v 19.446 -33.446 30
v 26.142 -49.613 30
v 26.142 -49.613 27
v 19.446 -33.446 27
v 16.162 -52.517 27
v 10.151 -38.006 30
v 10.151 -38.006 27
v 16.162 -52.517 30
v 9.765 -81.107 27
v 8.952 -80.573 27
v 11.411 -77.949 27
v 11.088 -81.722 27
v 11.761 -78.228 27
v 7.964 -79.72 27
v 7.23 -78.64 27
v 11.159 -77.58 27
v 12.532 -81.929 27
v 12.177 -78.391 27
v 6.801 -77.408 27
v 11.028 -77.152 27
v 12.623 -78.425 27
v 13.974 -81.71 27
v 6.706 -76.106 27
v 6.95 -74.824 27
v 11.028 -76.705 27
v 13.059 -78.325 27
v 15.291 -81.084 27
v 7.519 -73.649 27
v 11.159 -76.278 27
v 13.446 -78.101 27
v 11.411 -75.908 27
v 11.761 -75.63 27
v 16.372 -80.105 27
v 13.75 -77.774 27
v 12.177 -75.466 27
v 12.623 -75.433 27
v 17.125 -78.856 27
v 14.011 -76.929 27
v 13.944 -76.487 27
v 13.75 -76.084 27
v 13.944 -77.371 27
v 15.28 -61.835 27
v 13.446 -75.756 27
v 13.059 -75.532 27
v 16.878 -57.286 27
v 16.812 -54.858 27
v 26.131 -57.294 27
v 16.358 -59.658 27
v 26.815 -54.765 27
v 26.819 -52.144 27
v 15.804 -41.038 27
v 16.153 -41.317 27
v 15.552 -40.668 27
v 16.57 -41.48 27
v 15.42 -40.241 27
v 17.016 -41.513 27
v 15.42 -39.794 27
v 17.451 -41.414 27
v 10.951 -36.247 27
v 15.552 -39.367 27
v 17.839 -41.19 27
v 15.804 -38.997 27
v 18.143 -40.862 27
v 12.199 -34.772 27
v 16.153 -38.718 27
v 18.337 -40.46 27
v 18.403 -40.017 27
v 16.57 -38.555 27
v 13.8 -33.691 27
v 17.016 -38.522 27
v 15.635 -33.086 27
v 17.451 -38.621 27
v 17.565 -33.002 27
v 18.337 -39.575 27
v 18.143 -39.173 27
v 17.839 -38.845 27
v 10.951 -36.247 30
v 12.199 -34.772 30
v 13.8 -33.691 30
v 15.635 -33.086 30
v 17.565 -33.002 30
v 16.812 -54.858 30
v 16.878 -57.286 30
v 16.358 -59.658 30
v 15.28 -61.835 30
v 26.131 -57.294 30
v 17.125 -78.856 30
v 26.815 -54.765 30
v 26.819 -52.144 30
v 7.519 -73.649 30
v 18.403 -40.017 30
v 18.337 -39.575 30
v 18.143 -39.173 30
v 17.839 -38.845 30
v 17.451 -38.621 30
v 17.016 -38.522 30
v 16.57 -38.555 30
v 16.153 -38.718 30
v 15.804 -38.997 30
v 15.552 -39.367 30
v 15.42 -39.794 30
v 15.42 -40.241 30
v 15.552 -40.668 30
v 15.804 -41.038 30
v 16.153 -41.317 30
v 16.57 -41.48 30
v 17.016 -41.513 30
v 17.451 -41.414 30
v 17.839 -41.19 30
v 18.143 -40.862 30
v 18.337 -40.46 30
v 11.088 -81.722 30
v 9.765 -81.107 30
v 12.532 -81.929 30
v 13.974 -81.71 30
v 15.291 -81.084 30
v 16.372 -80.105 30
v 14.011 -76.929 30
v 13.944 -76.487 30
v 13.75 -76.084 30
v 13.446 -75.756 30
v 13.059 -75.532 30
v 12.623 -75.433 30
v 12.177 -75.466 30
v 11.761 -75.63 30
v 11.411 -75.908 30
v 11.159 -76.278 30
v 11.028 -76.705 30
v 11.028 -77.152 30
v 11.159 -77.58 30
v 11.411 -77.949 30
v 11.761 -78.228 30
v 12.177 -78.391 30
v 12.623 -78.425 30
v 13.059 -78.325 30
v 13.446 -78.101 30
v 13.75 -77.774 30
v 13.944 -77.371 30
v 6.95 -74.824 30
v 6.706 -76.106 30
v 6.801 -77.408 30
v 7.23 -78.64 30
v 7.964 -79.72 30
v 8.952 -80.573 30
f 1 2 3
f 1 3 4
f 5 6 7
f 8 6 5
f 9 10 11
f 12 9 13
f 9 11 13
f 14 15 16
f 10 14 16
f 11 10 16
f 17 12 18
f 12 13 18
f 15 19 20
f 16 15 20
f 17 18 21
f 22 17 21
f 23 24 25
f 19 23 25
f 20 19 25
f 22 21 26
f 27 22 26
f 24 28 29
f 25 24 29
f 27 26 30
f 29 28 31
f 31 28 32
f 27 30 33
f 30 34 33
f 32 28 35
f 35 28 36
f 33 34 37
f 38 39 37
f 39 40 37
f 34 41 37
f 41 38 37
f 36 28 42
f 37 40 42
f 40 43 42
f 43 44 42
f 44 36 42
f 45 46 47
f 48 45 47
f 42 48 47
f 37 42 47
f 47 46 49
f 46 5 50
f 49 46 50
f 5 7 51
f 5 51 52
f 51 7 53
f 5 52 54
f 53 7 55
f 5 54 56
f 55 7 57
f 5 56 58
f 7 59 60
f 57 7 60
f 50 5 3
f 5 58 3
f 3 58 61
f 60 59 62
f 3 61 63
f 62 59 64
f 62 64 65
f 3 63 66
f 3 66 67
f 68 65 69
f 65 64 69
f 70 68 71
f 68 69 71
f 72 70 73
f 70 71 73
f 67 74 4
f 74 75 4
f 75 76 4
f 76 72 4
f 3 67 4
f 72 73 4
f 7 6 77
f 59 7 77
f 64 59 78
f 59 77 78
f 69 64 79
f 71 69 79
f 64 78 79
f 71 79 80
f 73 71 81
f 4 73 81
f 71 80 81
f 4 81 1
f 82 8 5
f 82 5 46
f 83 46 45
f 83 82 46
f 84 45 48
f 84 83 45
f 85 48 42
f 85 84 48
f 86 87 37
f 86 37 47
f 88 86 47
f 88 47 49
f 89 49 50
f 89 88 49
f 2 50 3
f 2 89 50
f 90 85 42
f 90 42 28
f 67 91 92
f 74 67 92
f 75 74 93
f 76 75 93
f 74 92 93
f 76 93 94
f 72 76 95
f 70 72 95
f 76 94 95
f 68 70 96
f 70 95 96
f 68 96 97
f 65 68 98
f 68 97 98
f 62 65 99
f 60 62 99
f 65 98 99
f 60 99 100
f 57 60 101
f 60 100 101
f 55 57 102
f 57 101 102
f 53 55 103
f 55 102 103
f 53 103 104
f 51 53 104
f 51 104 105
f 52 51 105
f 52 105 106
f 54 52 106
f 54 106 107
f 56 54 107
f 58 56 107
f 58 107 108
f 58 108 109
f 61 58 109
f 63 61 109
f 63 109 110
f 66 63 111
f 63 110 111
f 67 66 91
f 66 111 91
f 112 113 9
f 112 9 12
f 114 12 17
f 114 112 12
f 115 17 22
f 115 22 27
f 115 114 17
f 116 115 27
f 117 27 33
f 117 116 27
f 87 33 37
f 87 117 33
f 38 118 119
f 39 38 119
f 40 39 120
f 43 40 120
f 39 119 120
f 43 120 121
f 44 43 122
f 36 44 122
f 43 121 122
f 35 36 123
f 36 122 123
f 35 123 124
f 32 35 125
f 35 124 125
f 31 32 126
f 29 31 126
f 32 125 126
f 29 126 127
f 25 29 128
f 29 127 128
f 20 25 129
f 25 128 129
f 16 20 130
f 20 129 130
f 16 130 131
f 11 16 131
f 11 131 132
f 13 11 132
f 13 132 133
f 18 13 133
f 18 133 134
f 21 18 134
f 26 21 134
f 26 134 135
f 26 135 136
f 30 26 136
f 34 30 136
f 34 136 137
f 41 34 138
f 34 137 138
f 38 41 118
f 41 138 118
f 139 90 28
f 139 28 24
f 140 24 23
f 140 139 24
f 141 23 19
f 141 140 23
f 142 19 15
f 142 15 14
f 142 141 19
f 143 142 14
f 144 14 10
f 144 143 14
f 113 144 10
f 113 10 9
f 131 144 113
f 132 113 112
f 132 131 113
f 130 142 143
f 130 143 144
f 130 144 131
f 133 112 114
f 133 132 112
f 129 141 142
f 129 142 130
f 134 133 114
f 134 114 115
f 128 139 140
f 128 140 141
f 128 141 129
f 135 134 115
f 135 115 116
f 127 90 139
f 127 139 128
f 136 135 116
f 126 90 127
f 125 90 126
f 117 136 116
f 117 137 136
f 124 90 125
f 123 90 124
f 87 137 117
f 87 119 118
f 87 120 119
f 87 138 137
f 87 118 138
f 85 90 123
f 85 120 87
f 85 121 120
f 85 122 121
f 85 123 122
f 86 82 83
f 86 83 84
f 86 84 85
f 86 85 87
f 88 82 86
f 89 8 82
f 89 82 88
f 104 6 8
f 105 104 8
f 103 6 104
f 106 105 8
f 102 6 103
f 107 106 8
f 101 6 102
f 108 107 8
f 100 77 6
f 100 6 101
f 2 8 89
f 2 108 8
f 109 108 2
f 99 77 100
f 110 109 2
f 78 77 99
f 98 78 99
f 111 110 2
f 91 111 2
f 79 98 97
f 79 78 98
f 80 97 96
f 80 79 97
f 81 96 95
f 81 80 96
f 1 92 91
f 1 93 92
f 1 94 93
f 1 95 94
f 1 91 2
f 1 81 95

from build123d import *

# Parameters (mm, degrees)
SKETCH_1_R          = 18
LASHENA_DEPTH       = 30
CUT_EXTRUDEA_DEPTH  = 30
WWW_KYTOOL_CN_COUNT = 16
SKETCH_3_W          = 35.542909486
SKETCH_3_H          = 27
CUT_EXTRUDE_2_DEPTH = 30
SKETCH_4_R          = 1.5
CUT_EXTRUDE_3_DEPTH = 60
SKETCH_5_R          = 1.5
EXTRUDE_3_DEPTH     = 3
CUT_EXTRUDE_5_DEPTH = 3


with BuildPart() as part:
    # 草图1 → LaShenA (new body)
    with BuildSketch(Plane.XY):
        Circle(SKETCH_1_R)
    extrude(amount=LASHENA_DEPTH)

    # SketchA → Cut-ExtrudeA (cut)
    with BuildSketch(Plane.XY.offset(30)):
        with BuildLine():
            ThreePointArc((0.423212707, 13.493364703), (0, 13.5), (-0.423212707, 13.493364703))
            ThreePointArc((-0.423212707, 13.493364703), (-0.952770902, 13.685686791), (-1.20440395, 14.18977059))
            add(Edge.make_bspline(
                [(-1.20440395, 14.18977059), (-1.226562505, 14.455224305), (-1.213843633, 14.773889884), (-1.273675597, 15.110607864), (-1.299119688, 15.21139578), (-1.321432077, 15.29109757), (-1.349914152, 15.382250837), (-1.385146673, 15.484587535), (-1.427834192, 15.597770763), (-1.478623281, 15.721446817), (-1.538159915, 15.855229004), (-1.607069773, 15.998703507), (-1.685962928, 16.151428337), (-1.775430978, 16.312934487), (-1.876046532, 16.482726463), (-1.98836201, 16.660283053), (-2.112908684, 16.845058076), (-2.250195688, 17.036481179), (-2.400709063, 17.233958676), (-2.56491084, 17.43687441), (-2.743238138, 17.644590662), (-2.936102365, 17.856449073), (-3.14388814, 18.07177164), (-3.447378451, 18.368492697), (-3.689495989, 18.585006365), (-3.858042439, 18.727457792)],
                knots=[0.122308221, 0.122308221, 0.122308221, 0.122308221, 0.250610689, 0.276296194, 0.287604067, 0.300967916, 0.316387742, 0.333863545, 0.353395324, 0.37498308, 0.398626813, 0.424326522, 0.452082207, 0.48189387, 0.513761509, 0.547685125, 0.583664717, 0.621700286, 0.661791832, 0.703939355, 0.748142854, 0.79440233, 0.842717782, 0.893089212, 1, 1, 1, 1], degree=3))
            ThreePointArc((-3.858042439, 18.727457792), (0, 19.120726106), (3.858042439, 18.727457792))
            add(Edge.make_bspline(
                [(1.20440395, 14.18977059), (1.226562505, 14.455224305), (1.213843633, 14.773889884), (1.273675597, 15.110607864), (1.299119688, 15.21139578), (1.321432077, 15.29109757), (1.349914152, 15.382250837), (1.385146673, 15.484587535), (1.427834192, 15.597770763), (1.478623281, 15.721446817), (1.538159915, 15.855229004), (1.607069773, 15.998703507), (1.685962928, 16.151428337), (1.775430978, 16.312934487), (1.876046532, 16.482726463), (1.98836201, 16.660283053), (2.112908684, 16.845058076), (2.250195688, 17.036481179), (2.400709063, 17.233958676), (2.56491084, 17.43687441), (2.743238138, 17.644590662), (2.936102365, 17.856449073), (3.14388814, 18.07177164), (3.447378451, 18.368492697), (3.689495989, 18.585006365), (3.858042439, 18.727457792)],
                knots=[0.122308221, 0.122308221, 0.122308221, 0.122308221, 0.250610689, 0.276296194, 0.287604067, 0.300967916, 0.316387742, 0.333863545, 0.353395324, 0.37498308, 0.398626813, 0.424326522, 0.452082207, 0.48189387, 0.513761509, 0.547685125, 0.583664717, 0.621700286, 0.661791832, 0.703939355, 0.748142854, 0.79440233, 0.842717782, 0.893089212, 1, 1, 1, 1], degree=3))
            ThreePointArc((1.20440395, 14.18977059), (0.952770902, 13.685686791), (0.423212707, 13.493364703))
        make_face()
    cut_extrudea = extrude(amount=-CUT_EXTRUDEA_DEPTH, mode=Mode.SUBTRACT)

    # www.KYTool.cn: Cut-ExtrudeA ×16 about axis
    www_kytool_cn_axis = Axis((0, 0, -80.9), (0, 0, 1))
    for i in range(1, WWW_KYTOOL_CN_COUNT):
        add(cut_extrudea.rotate(www_kytool_cn_axis, i * 360 / WWW_KYTOOL_CN_COUNT), mode=Mode.SUBTRACT)

    # 草图3 → 切除-拉伸2 (cut, symmetric)
    with BuildSketch(Plane(origin=(0, 0, 0), x_dir=(1, 0, 0), z_dir=(0, 1, 0))):
        with Locations((0, -13.5)):
            Rectangle(SKETCH_3_W, SKETCH_3_H)
    extrude(amount=CUT_EXTRUDE_2_DEPTH, both=True, mode=Mode.SUBTRACT)

    # 草图4 → 切除-拉伸3 (cut)
    with BuildSketch(Plane.XY.offset(30)):
        Circle(SKETCH_4_R)
    extrude(amount=-CUT_EXTRUDE_3_DEPTH, mode=Mode.SUBTRACT)

    # 草图5 → 凸台-拉伸3 (add)
    with BuildSketch(Plane.XY.offset(30)):
        with BuildLine():
            Line((15.280220873, -61.835446614), (7.518552247, -73.648578352))
            ThreePointArc((7.518552247, -73.648578352), (6.801054577, -77.407548694), (8.951700529, -80.572889581))
            Line((8.951700529, -80.572889581), (9.765341245, -81.107481911))
            ThreePointArc((9.765341245, -81.107481911), (13.973775635, -81.709971806), (17.124630908, -78.855847572))
            Line((17.124630908, -78.855847572), (26.13082512, -57.293888764))
            ThreePointArc((26.13082512, -57.293888764), (26.903397768, -53.454512274), (26.142204066, -49.612863608))
            Line((26.142204066, -49.612863608), (9.545941546, -9.545941546))
            Line((9.545941546, -9.545941546), (0, -13.5))
            Line((0, -13.5), (16.161556687, -52.517449343))
            ThreePointArc((16.161556687, -52.517449343), (16.878328365, -57.285923538), (15.280220873, -61.835446614))
        make_face()
        with Locations((16.903408741, -40.017494037)):
            Circle(SKETCH_5_R, mode=Mode.SUBTRACT)
        with Locations((12.510922719, -76.928752156)):
            Circle(SKETCH_5_R, mode=Mode.SUBTRACT)
    extrude(amount=-EXTRUDE_3_DEPTH)

    # 草图8 → 切除-拉伸5 (cut)
    with BuildSketch(Plane.XY.offset(30)):
        with BuildLine():
            Line((-47.449101502, -4.18243968), (9.857223077, -40.017494037))
            ThreePointArc((9.857223077, -40.017494037), (14.412678985, -33.42621209), (22.188716957, -35.357638944))
            Line((22.188716957, -35.357638944), (66.6397739, 3.833166133))
            Line((66.6397739, 3.833166133), (-5.431022365, 32.995833694))
            Line((-5.431022365, 32.995833694), (-47.449101502, -4.18243968))
        make_face()
    extrude(amount=-CUT_EXTRUDE_5_DEPTH, mode=Mode.SUBTRACT)


solid = part.part
